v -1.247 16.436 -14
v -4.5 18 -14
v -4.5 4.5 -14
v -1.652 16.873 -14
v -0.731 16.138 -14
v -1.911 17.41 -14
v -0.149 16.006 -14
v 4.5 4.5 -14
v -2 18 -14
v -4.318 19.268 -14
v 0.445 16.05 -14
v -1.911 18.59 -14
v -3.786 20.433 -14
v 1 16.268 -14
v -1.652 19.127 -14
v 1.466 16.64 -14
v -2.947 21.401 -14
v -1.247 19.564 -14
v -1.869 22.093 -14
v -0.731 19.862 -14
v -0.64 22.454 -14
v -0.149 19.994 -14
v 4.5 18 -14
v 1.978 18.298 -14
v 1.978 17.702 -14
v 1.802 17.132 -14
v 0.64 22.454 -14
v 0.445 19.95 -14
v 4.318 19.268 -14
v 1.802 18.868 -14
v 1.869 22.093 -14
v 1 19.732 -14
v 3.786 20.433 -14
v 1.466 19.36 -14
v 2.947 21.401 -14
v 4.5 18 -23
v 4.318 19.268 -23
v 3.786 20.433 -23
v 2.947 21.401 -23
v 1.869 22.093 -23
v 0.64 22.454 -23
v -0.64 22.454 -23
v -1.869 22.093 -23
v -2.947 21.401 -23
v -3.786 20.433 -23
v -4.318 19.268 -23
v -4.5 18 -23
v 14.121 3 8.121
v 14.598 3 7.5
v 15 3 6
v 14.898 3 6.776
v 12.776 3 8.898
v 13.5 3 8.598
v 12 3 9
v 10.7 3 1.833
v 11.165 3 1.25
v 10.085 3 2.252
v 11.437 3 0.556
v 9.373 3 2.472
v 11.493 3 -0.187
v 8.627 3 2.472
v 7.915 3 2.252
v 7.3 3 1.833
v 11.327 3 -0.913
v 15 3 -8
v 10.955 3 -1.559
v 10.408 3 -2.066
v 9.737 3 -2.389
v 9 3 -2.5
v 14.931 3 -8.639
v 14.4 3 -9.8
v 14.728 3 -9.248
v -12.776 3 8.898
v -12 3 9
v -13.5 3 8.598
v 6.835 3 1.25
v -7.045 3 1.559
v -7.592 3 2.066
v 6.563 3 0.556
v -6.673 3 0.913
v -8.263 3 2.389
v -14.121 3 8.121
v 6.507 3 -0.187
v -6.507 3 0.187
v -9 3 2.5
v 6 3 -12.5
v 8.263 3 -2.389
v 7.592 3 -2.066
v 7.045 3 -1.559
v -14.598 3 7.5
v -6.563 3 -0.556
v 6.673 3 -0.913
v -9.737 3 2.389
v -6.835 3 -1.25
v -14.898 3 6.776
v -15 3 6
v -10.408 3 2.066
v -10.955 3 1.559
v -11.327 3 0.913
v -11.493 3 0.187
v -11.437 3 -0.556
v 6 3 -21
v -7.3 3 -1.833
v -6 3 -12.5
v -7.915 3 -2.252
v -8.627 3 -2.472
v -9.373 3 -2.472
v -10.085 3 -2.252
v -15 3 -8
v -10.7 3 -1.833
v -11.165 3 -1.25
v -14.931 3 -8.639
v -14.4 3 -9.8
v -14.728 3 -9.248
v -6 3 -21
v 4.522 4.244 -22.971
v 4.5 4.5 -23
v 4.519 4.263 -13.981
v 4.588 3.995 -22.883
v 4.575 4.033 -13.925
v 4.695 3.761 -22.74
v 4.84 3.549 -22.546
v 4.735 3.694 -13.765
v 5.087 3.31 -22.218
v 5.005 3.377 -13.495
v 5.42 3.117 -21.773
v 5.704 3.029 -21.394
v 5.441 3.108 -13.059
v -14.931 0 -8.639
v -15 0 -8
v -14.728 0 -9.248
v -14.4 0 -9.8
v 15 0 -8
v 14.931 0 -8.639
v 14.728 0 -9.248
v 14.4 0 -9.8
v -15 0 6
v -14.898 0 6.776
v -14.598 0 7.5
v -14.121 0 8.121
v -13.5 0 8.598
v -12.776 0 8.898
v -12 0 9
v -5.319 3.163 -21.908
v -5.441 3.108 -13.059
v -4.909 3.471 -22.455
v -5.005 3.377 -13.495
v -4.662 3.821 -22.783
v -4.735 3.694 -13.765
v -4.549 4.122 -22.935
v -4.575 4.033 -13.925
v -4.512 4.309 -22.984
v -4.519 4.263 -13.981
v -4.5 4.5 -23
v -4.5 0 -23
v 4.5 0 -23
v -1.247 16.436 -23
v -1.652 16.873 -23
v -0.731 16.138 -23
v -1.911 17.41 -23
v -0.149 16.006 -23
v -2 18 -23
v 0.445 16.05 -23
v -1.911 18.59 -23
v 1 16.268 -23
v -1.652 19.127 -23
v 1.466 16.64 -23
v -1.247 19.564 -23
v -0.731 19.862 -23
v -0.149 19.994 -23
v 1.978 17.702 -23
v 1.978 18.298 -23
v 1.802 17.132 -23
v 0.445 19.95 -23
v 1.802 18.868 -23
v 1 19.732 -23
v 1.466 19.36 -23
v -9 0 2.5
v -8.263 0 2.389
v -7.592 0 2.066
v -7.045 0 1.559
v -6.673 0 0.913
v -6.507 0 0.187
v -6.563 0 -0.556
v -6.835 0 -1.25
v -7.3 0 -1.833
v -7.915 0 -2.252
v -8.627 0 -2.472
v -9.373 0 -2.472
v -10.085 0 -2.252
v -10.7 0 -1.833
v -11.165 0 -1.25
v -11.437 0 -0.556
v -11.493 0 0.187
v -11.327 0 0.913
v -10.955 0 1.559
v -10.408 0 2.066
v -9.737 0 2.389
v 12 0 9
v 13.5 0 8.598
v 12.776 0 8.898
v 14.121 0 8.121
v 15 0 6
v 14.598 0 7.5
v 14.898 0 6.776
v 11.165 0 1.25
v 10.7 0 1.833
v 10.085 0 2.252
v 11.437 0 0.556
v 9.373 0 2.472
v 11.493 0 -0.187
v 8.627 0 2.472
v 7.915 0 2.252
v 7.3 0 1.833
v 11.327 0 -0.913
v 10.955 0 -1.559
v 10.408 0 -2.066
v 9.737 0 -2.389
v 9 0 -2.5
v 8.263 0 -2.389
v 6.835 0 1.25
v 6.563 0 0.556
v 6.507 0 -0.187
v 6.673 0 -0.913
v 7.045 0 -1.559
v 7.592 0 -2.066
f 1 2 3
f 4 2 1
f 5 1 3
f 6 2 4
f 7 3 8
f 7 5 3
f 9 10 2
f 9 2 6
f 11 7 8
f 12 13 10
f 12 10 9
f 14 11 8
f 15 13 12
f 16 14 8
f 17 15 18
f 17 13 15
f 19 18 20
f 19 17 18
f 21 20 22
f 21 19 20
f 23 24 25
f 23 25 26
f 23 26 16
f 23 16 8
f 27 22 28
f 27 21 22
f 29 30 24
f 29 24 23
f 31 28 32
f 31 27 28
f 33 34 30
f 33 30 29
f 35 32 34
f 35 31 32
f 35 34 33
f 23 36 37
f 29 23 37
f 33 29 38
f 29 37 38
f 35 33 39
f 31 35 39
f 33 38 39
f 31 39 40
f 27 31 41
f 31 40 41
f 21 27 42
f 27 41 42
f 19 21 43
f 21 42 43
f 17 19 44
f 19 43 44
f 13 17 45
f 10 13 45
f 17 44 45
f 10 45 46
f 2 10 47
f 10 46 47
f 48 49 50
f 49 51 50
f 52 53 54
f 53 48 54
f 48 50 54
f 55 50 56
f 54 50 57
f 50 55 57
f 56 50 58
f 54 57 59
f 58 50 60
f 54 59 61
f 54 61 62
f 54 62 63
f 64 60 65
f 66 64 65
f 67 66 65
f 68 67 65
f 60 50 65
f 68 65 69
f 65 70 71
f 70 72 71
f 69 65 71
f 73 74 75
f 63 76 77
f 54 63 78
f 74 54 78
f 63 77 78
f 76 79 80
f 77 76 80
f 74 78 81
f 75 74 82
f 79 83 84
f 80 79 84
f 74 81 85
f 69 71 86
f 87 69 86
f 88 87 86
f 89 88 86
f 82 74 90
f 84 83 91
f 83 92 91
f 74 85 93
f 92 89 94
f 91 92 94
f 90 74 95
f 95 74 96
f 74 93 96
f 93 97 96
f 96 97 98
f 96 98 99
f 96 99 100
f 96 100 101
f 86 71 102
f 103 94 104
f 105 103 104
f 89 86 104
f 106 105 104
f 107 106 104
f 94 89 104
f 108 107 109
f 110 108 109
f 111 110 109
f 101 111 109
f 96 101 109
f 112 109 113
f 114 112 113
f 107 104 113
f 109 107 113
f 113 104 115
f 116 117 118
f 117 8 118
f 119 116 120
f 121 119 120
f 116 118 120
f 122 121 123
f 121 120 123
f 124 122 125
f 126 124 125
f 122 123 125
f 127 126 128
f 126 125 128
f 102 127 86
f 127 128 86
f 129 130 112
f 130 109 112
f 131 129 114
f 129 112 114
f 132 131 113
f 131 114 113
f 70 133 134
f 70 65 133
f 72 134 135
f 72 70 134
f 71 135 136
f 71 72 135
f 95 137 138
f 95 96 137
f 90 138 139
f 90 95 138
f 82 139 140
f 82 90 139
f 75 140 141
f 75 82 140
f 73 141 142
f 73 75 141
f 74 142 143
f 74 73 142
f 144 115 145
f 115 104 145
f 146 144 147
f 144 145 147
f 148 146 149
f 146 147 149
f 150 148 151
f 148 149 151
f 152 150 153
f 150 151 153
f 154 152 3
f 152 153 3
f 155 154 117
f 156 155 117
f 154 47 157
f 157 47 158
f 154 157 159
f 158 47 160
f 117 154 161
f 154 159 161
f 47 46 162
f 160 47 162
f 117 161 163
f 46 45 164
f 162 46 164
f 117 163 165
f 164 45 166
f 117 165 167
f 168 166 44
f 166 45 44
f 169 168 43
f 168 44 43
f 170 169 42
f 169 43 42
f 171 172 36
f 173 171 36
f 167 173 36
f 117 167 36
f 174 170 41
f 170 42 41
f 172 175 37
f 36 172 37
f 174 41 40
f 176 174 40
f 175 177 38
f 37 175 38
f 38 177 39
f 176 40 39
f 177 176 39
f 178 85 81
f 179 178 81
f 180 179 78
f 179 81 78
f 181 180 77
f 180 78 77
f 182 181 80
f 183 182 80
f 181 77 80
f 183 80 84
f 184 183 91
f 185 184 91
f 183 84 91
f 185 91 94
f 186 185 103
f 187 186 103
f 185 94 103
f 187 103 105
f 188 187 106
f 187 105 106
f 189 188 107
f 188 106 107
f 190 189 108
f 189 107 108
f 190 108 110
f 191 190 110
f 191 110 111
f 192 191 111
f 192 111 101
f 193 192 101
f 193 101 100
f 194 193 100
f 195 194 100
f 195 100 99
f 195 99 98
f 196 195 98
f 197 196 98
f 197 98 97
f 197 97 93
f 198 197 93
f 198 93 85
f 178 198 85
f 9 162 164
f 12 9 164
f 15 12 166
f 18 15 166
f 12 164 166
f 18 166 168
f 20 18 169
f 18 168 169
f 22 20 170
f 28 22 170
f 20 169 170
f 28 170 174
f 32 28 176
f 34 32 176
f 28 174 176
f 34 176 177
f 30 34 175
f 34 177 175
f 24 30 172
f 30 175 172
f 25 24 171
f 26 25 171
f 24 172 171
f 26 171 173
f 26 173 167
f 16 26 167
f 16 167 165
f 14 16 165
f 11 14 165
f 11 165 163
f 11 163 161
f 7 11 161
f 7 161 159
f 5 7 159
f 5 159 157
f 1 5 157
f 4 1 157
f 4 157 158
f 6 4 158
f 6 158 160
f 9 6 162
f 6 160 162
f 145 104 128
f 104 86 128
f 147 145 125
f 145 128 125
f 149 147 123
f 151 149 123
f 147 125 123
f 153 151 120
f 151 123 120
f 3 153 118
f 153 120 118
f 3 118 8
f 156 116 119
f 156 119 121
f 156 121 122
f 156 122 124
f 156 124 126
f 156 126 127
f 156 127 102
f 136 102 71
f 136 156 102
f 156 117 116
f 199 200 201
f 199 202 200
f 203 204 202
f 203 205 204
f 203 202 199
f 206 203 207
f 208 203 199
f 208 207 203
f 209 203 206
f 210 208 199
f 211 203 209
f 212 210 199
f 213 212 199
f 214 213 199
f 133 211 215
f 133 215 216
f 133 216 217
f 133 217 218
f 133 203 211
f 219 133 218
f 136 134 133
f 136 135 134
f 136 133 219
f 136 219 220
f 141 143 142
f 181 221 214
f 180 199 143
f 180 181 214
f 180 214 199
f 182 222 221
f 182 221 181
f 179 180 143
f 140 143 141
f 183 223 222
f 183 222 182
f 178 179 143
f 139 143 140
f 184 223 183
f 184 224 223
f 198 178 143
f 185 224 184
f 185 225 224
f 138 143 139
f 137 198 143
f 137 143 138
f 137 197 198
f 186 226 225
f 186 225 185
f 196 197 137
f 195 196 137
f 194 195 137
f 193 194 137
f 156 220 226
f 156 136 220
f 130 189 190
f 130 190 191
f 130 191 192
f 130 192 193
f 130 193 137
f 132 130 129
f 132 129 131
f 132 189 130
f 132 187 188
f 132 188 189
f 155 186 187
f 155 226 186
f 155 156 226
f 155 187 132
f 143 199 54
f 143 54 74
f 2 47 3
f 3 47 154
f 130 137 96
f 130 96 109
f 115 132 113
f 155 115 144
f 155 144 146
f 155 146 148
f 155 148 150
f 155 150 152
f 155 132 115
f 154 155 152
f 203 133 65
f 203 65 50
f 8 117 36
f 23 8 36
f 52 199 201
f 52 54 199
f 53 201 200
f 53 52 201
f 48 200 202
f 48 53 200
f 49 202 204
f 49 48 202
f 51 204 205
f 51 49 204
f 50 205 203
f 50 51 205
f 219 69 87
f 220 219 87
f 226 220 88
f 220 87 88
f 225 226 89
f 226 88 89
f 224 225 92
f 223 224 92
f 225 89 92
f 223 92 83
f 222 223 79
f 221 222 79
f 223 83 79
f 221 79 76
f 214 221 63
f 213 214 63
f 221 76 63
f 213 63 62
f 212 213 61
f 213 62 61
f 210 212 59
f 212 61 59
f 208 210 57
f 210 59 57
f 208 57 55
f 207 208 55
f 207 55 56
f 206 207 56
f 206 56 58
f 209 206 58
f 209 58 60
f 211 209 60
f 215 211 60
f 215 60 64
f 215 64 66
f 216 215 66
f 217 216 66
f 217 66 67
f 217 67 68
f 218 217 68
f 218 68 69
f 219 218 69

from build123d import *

# Parameters (mm, degrees)
BOSS_EXTRUDE1_DEPTH = 3
SKETCH2_R           = 2
BOSS_EXTRUDE2_DEPTH = 9
FILLET1_R           = 1.5
FILLET2_R           = 3
SKETCH3_R           = 2.5
CUT_EXTRUDE1_DEPTH  = 34.678628238


with BuildPart() as part:
    # Sketch1 → Boss-Extrude1 (new body)
    with BuildSketch(Plane(origin=(0, 0, 0), x_dir=(1, 0, 0), z_dir=(0, 1, 0))):
        Polygon((-15, 9), (-4.5, 23), (4.5, 23), (15, 9), (15, -9), (-15, -9), align=None)
    extrude(amount=BOSS_EXTRUDE1_DEPTH)

    # Sketch2 → Boss-Extrude2 (add)
    with BuildSketch(Plane(origin=(0, 0, -23), x_dir=(-1, 0, 0), z_dir=(0, 0, -1))):
        with BuildLine():
            Line((-4.5, 3), (-4.5, 18))
            ThreePointArc((-4.5, 18), (0, 22.5), (4.5, 18))
            Line((4.5, 18), (4.5, 3))
            Line((4.5, 3), (-4.5, 3))
        make_face()
        with Locations((0, 18)):
            Circle(SKETCH2_R, mode=Mode.SUBTRACT)
    extrude(amount=-BOSS_EXTRUDE2_DEPTH)

    # Fillet1
    fillet1_edges = [part.edges().sort_by_distance(p)[0] for p in [
        (0, 3, -14),
        (-4.5, 3, -18.5),
        (4.5, 3, -18.5),
    ]]
    fillet(fillet1_edges, radius=FILLET1_R)

    # Fillet2
    fillet2_edges = [part.edges().sort_by_distance(p)[0] for p in [
        (-15, 1.5, -9),
        (15, 1.5, -9),
        (15, 1.5, 9),
        (-15, 1.5, 9),
    ]]
    fillet(fillet2_edges, radius=FILLET2_R)

    # Sketch3 → Cut-Extrude1 (cut, through all)
    with BuildSketch(Plane(origin=(0, 3, 0), x_dir=(1, 0, 0), z_dir=(0, 1, 0))):
        with Locations(Location((-9, 0, 0), (0, 0, 270))):
            Circle(SKETCH3_R)
        with Locations(Location((9, 0, 0), (0, 0, 90))):
            Circle(SKETCH3_R)
    extrude(amount=-CUT_EXTRUDE1_DEPTH, mode=Mode.SUBTRACT)


solid = part.part
